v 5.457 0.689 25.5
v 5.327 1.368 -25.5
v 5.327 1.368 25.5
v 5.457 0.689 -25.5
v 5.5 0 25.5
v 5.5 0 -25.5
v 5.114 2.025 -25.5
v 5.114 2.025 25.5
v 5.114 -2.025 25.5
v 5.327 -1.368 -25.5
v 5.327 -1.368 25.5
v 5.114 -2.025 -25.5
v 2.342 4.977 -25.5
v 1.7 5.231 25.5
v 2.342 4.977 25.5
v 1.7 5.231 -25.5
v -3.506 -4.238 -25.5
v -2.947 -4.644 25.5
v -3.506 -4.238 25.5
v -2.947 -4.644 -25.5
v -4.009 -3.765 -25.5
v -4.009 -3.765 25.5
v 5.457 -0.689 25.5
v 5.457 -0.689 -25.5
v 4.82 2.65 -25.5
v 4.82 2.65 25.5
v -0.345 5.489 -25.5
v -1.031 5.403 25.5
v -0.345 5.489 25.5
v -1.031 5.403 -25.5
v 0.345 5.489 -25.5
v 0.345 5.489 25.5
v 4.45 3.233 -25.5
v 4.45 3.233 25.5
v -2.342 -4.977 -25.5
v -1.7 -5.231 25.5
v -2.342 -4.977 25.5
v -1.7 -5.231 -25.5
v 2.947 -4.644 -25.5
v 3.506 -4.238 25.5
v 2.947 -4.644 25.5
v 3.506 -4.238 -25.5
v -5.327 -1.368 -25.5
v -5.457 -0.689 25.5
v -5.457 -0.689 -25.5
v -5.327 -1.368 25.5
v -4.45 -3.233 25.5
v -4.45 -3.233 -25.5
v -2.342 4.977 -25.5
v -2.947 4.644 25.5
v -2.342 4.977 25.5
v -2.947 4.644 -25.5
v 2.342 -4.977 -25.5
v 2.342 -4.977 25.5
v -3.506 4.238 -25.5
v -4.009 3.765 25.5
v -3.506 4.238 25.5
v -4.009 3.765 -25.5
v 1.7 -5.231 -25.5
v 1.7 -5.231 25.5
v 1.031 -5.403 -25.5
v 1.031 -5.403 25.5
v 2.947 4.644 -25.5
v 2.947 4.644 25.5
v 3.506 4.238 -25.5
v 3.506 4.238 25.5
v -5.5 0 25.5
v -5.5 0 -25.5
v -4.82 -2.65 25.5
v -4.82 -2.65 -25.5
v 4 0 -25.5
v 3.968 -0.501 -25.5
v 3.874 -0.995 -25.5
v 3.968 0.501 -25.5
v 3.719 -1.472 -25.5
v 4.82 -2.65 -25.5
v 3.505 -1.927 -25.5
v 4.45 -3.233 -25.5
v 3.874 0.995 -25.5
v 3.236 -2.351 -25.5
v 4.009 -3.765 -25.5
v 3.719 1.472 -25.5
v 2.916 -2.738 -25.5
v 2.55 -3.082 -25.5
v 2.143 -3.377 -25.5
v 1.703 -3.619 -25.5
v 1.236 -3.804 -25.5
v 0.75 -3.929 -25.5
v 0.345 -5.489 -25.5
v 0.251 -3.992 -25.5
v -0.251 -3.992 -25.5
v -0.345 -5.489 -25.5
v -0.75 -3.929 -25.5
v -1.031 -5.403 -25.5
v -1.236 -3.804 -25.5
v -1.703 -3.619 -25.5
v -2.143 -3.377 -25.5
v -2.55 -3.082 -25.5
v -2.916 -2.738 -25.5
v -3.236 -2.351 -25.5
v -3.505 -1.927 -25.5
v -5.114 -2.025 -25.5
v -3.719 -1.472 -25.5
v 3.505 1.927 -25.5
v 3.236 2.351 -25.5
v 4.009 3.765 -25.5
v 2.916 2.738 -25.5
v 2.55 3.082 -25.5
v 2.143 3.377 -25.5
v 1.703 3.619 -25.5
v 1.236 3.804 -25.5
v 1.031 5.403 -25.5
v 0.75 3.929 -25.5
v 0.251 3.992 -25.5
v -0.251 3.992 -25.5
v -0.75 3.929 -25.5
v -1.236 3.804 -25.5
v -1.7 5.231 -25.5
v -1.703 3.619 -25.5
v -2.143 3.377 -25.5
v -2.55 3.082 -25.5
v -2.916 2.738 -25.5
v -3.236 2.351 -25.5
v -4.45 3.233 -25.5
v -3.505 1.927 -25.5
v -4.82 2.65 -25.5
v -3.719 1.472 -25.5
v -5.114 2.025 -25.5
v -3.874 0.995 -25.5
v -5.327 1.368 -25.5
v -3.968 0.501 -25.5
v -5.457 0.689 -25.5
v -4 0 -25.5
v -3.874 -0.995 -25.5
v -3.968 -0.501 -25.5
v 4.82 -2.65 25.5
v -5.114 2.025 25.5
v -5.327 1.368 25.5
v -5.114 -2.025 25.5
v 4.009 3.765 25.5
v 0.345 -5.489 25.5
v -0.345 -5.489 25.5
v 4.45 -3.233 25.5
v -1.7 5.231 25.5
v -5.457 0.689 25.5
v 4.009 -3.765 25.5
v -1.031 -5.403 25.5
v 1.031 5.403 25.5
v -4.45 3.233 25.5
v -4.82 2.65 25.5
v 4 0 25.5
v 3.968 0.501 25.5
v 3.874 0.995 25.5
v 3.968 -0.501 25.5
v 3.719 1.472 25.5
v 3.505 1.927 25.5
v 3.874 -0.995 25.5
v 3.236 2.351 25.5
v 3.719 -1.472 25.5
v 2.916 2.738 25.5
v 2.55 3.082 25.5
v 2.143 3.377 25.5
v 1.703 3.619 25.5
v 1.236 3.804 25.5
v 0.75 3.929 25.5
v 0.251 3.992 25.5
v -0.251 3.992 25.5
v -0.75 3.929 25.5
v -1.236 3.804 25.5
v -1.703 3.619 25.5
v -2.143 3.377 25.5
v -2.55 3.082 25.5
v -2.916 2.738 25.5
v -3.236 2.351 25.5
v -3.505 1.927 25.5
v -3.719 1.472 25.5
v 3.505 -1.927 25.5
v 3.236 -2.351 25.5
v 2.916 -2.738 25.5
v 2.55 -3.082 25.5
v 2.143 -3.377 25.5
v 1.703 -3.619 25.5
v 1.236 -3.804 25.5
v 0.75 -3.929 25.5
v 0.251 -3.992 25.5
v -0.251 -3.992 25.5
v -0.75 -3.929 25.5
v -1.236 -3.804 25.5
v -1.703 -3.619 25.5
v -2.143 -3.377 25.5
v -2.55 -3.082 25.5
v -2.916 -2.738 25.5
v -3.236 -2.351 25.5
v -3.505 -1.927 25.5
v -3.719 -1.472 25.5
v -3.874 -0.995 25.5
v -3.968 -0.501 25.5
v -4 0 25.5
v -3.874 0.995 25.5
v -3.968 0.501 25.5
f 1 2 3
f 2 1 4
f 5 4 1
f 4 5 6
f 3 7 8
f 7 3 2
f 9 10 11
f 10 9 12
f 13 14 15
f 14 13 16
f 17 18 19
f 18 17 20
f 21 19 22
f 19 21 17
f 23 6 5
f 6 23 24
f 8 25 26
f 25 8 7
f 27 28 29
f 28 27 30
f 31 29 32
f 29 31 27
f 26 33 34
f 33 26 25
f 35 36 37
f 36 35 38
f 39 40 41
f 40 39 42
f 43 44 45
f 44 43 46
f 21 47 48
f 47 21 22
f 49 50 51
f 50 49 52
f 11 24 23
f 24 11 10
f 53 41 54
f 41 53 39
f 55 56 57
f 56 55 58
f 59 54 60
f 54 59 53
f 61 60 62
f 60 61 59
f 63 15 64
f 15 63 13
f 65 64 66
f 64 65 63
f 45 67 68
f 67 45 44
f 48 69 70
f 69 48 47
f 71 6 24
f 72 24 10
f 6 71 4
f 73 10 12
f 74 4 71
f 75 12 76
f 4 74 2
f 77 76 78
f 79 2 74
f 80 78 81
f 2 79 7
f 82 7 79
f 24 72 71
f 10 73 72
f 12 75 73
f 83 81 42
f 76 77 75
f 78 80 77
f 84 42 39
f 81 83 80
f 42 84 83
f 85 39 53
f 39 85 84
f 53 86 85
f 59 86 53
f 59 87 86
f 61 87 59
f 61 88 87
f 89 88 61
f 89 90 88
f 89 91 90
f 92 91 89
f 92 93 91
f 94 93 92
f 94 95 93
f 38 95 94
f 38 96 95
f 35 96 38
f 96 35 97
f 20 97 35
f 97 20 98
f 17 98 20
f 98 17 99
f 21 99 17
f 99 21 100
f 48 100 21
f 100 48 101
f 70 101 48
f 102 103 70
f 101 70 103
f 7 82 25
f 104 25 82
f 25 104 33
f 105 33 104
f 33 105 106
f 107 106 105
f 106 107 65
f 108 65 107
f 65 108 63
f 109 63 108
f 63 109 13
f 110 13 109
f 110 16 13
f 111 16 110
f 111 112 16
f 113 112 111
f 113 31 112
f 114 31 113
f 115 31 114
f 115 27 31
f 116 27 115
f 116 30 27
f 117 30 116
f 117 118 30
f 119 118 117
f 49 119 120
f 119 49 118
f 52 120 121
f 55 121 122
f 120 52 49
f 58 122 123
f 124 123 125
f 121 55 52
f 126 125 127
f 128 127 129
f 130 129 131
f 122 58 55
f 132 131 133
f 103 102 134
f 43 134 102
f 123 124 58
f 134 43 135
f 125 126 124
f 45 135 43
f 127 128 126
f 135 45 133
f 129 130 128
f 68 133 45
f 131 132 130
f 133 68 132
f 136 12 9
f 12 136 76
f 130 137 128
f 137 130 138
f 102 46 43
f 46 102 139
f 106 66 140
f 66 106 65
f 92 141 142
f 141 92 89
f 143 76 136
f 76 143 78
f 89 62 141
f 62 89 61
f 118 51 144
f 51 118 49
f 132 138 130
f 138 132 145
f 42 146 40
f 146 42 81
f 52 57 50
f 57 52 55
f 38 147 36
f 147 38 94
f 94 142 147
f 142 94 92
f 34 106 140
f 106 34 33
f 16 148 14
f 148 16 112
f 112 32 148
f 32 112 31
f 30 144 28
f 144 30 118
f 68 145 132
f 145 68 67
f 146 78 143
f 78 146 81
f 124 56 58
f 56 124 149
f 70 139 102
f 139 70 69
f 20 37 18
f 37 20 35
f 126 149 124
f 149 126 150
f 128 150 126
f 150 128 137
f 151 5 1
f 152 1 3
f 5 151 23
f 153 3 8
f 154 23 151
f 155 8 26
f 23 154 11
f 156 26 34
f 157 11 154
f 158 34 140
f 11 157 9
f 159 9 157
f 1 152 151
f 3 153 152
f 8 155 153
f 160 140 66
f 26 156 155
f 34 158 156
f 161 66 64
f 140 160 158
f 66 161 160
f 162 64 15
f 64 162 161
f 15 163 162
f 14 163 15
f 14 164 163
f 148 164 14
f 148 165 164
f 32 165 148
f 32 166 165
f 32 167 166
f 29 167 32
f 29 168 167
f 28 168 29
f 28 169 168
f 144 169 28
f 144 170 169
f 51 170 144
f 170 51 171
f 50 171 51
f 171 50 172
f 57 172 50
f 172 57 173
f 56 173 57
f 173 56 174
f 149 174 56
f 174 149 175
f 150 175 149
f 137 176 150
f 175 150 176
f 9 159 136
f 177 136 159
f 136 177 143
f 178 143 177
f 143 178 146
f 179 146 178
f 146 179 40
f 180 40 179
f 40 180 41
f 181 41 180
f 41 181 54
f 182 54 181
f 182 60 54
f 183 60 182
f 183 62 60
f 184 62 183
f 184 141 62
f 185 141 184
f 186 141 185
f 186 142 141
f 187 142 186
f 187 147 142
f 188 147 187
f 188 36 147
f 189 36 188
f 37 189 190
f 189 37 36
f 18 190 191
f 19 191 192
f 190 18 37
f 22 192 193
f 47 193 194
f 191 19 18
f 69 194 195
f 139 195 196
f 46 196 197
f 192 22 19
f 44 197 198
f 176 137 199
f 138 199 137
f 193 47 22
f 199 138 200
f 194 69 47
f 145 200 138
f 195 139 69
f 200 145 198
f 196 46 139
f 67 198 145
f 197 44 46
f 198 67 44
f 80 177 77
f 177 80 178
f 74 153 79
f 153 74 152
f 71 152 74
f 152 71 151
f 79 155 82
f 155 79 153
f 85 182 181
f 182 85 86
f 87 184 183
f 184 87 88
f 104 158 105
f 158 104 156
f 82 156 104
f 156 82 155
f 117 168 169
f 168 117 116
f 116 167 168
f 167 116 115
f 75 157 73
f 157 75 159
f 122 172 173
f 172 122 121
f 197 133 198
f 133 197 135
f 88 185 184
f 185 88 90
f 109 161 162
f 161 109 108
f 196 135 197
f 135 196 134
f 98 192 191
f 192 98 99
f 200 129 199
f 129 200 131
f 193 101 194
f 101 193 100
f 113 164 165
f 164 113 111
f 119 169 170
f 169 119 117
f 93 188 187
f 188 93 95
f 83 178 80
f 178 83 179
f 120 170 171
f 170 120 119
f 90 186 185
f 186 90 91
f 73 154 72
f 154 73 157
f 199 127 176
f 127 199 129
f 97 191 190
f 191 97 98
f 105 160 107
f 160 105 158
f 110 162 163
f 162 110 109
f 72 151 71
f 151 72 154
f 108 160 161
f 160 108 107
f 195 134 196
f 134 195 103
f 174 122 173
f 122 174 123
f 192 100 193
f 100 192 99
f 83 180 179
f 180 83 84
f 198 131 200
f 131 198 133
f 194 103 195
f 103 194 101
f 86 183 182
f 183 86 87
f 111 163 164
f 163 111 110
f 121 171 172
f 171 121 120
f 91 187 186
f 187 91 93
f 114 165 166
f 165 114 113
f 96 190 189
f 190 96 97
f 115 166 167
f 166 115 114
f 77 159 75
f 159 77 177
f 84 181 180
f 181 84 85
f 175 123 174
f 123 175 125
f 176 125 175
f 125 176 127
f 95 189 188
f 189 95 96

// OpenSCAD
$fn = 50;


difference() {
	union() {
		translate(v = [0, 0, -25.5000000000]) {
			cylinder(h = 51, r = 5.5000000000);
		}
	}
	union() {
		translate(v = [0, 0, -100.0000000000]) {
			cylinder(h = 200, r = 4.0000000000);
		}
	}
}
